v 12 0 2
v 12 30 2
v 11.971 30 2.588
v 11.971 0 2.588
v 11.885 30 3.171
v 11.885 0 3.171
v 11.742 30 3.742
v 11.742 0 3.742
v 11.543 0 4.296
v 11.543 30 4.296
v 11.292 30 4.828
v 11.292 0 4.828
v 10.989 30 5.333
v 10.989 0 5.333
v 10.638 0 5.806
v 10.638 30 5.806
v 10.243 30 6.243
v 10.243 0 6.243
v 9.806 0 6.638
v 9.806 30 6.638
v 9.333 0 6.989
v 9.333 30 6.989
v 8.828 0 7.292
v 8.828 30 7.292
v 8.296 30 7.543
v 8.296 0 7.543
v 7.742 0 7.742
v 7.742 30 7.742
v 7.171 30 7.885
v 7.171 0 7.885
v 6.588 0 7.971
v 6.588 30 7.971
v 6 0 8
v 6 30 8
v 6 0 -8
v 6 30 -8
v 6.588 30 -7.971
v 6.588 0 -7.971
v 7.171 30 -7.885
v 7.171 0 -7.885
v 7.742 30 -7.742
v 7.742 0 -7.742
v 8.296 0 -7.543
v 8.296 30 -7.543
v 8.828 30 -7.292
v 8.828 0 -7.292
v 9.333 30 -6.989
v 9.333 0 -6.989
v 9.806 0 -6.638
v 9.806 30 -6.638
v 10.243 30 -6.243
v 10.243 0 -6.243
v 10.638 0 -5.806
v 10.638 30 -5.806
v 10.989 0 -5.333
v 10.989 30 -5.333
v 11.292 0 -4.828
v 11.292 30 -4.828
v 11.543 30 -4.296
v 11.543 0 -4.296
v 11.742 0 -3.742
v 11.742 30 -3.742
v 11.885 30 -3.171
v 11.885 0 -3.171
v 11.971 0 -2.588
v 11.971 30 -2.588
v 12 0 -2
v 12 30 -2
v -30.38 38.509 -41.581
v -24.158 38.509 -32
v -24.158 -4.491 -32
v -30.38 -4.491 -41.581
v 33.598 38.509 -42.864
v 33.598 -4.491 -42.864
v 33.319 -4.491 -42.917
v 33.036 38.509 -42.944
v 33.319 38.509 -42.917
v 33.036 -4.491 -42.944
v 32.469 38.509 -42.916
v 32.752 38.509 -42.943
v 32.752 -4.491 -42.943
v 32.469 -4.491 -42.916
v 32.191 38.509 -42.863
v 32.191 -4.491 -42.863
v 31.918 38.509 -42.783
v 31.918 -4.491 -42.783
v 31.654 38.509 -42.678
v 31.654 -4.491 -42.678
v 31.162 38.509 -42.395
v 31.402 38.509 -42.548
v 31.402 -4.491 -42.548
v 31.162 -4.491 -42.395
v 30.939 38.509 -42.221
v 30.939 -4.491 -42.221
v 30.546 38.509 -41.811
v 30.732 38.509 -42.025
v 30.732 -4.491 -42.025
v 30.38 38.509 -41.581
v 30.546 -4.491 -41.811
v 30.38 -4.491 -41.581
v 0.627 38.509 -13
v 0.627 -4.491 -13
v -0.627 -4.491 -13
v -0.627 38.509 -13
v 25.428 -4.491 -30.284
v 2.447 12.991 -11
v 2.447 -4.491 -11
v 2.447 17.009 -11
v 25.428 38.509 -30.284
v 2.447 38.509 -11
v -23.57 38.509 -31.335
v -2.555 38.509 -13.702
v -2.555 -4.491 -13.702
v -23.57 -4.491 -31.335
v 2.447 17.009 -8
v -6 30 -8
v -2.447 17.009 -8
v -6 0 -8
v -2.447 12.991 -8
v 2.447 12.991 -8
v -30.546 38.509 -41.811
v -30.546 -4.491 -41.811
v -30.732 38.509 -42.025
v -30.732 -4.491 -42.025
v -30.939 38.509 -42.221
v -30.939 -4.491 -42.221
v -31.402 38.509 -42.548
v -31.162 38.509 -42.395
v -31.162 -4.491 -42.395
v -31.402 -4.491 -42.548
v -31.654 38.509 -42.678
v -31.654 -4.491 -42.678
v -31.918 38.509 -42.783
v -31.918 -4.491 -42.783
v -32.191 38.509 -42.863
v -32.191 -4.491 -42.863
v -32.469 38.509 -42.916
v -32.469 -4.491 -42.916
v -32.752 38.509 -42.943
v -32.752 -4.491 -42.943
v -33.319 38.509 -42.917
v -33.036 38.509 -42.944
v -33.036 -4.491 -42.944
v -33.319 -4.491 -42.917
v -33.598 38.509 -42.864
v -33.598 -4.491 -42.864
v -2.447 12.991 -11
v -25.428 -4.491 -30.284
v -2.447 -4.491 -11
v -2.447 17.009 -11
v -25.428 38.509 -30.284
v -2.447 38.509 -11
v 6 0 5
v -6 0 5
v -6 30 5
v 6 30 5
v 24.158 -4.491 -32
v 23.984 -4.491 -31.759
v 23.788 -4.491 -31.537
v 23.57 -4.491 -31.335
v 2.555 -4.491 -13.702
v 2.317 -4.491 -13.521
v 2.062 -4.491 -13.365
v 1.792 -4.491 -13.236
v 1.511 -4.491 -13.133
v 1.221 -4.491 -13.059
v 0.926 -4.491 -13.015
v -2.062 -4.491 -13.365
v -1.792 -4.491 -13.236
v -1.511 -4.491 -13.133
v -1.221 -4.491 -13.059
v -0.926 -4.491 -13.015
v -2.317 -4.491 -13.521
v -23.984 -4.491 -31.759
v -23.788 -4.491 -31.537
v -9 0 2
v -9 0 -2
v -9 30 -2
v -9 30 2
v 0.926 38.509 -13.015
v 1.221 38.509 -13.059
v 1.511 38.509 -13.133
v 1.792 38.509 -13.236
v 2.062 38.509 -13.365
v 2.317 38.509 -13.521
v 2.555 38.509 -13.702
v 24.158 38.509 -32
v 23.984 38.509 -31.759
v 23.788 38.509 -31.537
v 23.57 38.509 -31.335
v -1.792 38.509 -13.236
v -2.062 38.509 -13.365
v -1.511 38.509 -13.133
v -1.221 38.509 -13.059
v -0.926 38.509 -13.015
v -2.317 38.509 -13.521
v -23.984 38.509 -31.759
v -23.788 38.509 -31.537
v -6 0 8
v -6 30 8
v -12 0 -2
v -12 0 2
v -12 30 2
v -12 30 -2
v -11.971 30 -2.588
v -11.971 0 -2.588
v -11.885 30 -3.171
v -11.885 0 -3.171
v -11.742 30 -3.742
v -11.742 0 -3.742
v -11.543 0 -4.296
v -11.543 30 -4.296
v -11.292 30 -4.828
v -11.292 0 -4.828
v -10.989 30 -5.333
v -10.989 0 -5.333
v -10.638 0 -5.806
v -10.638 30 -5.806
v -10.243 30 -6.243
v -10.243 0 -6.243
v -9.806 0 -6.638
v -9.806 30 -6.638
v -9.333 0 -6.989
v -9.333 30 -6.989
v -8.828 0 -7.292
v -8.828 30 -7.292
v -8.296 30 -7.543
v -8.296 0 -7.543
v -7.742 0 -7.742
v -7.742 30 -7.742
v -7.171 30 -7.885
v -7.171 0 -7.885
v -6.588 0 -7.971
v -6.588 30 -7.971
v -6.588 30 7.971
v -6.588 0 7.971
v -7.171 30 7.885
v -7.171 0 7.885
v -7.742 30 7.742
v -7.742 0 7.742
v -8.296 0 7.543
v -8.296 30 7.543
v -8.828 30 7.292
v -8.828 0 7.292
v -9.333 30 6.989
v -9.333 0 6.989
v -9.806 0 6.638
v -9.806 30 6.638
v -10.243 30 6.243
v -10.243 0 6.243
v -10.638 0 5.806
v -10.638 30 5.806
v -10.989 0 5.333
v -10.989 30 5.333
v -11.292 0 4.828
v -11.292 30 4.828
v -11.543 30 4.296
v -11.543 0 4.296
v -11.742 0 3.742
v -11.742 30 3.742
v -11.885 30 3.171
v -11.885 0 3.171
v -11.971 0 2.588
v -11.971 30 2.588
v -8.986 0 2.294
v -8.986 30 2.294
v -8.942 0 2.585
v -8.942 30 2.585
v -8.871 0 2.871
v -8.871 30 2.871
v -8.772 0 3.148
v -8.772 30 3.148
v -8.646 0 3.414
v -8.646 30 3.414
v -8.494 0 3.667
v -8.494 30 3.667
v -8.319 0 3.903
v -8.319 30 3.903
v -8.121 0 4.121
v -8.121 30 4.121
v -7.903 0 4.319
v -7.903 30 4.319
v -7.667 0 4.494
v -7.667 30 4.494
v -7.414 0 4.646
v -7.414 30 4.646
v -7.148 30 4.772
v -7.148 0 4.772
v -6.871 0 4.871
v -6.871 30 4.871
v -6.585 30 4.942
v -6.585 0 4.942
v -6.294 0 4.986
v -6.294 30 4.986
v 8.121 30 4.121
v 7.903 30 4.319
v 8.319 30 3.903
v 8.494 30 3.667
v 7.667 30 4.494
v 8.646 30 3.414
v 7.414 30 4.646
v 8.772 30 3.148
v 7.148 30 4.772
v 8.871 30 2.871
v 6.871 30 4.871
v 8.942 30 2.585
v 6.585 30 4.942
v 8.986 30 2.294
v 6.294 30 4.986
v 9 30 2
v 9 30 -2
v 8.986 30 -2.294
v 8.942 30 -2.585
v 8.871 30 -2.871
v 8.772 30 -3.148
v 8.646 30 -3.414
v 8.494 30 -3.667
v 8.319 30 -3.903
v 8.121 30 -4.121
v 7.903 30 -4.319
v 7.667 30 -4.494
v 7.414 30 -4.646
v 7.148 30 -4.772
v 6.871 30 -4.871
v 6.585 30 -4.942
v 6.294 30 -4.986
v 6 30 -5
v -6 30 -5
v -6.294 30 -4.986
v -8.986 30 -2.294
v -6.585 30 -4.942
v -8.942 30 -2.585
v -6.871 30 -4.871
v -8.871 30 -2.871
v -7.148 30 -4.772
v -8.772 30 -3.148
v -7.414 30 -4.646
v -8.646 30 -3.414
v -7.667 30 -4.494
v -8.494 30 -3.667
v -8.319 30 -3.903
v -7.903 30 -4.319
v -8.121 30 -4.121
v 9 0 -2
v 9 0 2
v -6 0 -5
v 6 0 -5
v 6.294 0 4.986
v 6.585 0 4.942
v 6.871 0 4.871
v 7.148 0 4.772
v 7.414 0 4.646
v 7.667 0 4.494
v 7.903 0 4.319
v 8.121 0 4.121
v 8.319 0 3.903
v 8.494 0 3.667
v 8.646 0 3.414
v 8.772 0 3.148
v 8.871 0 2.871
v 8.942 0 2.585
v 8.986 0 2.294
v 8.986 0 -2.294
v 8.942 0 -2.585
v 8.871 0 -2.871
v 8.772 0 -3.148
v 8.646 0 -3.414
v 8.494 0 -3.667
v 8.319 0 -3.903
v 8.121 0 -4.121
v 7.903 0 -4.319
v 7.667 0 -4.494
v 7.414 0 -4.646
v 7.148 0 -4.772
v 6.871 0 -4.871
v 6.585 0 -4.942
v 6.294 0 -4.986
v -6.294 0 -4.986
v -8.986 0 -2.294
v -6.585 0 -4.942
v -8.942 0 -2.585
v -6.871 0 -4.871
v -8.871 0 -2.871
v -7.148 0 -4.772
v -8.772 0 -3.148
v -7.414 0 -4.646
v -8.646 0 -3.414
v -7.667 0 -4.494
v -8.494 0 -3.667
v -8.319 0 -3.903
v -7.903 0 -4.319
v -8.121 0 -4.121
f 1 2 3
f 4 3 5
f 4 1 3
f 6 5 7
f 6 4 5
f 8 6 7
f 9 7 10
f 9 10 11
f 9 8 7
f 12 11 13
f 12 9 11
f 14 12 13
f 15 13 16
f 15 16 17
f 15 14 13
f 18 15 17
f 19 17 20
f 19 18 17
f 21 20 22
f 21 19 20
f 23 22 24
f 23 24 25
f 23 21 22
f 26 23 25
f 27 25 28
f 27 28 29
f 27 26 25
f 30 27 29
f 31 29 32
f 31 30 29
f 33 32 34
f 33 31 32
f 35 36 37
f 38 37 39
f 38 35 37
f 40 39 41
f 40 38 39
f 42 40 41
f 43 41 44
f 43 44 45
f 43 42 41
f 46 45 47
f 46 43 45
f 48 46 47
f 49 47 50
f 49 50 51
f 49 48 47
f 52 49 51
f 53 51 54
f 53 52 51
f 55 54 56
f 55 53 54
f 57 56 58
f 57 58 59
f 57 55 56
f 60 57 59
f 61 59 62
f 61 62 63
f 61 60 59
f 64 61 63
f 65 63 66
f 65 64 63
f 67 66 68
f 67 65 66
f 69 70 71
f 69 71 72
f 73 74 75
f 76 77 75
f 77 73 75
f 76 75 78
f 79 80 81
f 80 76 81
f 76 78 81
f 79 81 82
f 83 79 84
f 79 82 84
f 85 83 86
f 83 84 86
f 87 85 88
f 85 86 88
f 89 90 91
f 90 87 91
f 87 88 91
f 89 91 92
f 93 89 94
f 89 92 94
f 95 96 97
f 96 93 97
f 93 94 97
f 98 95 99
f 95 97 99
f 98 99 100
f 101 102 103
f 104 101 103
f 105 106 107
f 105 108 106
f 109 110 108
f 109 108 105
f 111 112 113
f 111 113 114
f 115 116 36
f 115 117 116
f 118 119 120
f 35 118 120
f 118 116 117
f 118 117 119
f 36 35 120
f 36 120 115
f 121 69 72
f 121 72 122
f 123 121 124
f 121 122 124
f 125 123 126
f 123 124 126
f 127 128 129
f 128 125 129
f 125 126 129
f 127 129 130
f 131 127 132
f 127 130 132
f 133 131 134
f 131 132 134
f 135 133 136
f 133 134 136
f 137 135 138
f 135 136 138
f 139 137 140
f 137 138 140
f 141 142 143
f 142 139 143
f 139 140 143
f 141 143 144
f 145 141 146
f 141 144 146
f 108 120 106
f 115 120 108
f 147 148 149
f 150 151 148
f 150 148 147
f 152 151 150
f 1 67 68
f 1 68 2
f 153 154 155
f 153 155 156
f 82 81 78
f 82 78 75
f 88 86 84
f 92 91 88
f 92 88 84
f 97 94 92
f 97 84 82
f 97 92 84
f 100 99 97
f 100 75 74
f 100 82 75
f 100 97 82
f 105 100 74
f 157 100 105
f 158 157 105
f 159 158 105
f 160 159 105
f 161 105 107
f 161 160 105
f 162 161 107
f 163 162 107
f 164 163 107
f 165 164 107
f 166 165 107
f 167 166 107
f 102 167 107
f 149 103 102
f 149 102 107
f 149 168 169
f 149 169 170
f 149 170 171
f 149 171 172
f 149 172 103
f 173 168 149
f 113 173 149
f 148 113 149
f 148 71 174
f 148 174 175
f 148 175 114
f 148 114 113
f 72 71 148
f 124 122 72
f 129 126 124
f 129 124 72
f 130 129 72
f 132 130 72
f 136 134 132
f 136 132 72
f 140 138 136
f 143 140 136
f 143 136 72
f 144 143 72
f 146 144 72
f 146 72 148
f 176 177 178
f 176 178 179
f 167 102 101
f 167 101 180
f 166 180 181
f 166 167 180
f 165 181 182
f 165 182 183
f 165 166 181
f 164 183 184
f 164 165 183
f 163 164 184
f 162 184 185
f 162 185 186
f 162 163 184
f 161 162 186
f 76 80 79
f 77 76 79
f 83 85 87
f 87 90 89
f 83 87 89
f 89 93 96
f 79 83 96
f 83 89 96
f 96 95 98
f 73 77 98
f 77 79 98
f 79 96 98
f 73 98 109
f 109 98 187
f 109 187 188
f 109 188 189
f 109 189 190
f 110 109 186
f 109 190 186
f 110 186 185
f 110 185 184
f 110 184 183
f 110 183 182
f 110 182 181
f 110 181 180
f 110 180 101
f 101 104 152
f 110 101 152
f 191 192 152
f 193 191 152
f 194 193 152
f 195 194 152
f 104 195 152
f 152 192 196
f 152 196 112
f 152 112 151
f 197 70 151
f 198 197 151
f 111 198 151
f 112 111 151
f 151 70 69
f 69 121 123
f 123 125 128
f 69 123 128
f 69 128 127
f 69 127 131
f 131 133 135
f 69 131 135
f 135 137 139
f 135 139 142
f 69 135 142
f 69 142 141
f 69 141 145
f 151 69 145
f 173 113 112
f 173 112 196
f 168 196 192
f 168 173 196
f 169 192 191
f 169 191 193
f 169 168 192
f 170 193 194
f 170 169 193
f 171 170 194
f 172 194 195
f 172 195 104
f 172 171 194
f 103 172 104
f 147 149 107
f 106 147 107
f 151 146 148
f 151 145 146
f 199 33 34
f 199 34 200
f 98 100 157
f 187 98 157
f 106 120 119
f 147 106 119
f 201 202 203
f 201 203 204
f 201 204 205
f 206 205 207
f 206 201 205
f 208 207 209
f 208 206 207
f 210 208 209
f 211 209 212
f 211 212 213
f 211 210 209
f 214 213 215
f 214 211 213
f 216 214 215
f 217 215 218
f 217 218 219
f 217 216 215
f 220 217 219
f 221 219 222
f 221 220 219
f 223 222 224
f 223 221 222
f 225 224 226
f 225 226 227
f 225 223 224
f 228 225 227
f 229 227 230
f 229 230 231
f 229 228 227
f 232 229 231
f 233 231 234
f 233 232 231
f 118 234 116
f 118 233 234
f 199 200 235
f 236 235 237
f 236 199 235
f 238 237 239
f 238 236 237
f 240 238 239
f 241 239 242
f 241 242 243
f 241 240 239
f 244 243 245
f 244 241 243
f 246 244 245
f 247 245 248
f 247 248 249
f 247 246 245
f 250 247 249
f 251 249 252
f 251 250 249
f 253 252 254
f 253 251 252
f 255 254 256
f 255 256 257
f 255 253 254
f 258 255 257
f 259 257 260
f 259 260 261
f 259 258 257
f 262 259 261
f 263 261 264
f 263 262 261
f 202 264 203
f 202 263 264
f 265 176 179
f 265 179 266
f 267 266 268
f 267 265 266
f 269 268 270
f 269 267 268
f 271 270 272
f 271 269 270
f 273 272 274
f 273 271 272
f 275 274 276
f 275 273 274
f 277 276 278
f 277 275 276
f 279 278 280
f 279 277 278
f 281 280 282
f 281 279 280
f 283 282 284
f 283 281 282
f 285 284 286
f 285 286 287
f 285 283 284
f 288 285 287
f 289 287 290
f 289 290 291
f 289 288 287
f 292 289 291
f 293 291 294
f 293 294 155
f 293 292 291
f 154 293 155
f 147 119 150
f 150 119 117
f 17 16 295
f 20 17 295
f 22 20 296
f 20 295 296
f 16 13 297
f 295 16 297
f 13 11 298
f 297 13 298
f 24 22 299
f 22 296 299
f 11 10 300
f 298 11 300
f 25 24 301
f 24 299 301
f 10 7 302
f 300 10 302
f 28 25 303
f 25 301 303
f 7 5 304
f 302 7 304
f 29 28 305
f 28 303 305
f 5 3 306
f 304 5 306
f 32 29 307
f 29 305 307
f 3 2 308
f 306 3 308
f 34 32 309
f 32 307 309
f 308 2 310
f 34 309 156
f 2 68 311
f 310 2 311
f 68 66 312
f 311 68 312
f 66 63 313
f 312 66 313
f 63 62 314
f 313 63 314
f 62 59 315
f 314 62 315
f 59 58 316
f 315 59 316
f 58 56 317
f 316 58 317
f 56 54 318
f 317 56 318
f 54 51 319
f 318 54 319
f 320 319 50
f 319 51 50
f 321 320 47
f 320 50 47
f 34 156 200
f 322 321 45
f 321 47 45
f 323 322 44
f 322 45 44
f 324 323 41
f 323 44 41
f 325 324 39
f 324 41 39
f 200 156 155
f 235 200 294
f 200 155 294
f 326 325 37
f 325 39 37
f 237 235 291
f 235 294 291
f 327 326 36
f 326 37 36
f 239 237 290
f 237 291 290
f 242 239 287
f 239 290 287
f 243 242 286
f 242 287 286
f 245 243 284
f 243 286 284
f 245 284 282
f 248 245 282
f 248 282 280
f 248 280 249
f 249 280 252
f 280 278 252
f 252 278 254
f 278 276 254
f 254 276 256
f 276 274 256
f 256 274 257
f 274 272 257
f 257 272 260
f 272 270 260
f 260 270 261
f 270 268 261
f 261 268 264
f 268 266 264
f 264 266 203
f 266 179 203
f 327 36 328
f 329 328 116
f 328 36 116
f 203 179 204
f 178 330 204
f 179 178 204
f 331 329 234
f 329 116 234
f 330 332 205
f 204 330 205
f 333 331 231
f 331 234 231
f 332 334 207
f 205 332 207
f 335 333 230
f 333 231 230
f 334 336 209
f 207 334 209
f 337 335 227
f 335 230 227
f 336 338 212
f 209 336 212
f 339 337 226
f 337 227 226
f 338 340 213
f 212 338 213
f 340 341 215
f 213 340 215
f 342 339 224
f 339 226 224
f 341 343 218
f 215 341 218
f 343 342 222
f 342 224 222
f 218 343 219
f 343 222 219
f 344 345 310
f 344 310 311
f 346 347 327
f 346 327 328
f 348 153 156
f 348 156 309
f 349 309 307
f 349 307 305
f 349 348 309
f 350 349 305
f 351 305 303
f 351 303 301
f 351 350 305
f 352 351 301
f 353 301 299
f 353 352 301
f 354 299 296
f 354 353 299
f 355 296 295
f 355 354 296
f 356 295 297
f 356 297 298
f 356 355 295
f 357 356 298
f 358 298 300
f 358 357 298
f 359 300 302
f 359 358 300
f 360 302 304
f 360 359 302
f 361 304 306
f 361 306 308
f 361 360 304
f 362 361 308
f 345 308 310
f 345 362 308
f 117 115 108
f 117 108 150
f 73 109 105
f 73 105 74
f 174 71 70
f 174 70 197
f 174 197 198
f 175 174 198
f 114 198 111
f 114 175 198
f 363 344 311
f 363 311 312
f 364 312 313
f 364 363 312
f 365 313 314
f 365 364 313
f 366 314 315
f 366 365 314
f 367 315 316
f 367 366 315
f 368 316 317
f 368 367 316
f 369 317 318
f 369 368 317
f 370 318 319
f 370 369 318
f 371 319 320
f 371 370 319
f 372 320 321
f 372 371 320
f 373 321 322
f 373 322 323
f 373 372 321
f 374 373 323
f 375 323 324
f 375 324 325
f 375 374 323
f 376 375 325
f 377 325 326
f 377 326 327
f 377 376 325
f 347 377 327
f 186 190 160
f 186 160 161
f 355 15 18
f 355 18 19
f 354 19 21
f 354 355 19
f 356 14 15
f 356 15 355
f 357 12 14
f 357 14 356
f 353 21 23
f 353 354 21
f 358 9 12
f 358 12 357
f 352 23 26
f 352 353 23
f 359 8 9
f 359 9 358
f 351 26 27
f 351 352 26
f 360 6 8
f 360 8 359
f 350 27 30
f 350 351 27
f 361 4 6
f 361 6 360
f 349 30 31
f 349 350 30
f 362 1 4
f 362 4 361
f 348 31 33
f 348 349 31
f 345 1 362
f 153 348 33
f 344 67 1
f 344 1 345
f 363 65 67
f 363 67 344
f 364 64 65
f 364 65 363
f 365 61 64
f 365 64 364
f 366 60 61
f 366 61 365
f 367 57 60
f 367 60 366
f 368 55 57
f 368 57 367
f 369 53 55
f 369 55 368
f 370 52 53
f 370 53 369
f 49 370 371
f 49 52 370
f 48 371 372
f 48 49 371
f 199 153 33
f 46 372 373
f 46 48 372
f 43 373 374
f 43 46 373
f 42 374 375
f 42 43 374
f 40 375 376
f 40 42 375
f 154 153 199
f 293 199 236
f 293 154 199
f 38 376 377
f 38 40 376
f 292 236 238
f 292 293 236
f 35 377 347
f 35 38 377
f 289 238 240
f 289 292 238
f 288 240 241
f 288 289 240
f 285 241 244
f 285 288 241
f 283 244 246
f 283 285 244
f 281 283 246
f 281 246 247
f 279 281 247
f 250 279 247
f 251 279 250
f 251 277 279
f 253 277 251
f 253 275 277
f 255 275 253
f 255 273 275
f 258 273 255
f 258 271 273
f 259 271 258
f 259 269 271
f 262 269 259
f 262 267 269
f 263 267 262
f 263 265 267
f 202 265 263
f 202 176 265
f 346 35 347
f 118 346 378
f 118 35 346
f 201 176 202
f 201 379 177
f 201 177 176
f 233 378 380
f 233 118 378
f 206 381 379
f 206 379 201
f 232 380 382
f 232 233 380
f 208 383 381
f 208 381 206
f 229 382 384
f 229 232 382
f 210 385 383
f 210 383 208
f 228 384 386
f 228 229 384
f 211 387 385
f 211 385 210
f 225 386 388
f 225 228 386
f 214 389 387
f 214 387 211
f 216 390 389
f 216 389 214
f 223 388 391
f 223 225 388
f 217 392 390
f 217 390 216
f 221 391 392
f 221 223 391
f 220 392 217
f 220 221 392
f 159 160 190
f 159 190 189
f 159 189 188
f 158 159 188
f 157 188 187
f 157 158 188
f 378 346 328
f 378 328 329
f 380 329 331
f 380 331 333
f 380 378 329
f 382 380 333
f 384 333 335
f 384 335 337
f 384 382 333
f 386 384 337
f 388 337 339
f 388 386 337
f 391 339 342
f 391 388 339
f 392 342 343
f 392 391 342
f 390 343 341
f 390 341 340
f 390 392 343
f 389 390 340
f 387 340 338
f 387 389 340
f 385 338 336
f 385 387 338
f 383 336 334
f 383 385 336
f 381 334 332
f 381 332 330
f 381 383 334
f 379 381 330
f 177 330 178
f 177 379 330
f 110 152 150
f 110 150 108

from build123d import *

# Parameters (mm, degrees)
SALIENTE_EXTRUIR1_DEPTH = 30
CROQUIS3_W              = 4.89350096
CROQUIS3_H              = 4.01782184
SALIENTE_EXTRUIR2_DEPTH = 3
SALIENTE_EXTRUIR3_DEPTH = 21.5
REDONDEO2_R             = 3


with BuildPart() as part:
    # Croquis1 → Saliente-Extruir1 (new body)
    with BuildSketch(Plane(origin=(0, 0, 0), x_dir=(1, 0, 0), z_dir=(0, 1, 0))):
        with BuildLine():
            Line((-6, 8), (6, 8))
            ThreePointArc((6, 8), (10.242640687, 6.242640687), (12, 2))
            Line((12, 2), (12, -2))
            ThreePointArc((12, -2), (10.242640687, -6.242640687), (6, -8))
            Line((6, -8), (-6, -8))
            ThreePointArc((-6, -8), (-10.242640687, -6.242640687), (-12, -2))
            Line((-12, -2), (-12, 2))
            ThreePointArc((-12, 2), (-10.242640687, 6.242640687), (-6, 8))
        make_face()
        with BuildLine():
            Line((-6, -5), (6, -5))
            ThreePointArc((6, -5), (8.121320344, -4.121320344), (9, -2))
            Line((9, -2), (9, 2))
            ThreePointArc((9, 2), (8.121320344, 4.121320344), (6, 5))
            Line((6, 5), (-6, 5))
            ThreePointArc((-6, 5), (-8.121320344, 4.121320344), (-9, 2))
            Line((-9, 2), (-9, -2))
            ThreePointArc((-9, -2), (-8.121320344, -4.121320344), (-6, -5))
        make_face(mode=Mode.SUBTRACT)
    extrude(amount=SALIENTE_EXTRUIR1_DEPTH)

    # Croquis3 → Saliente-Extruir2 (add)
    with BuildSketch(Plane(origin=(0, 0, -8), x_dir=(-1, 0, 0), z_dir=(0, 0, -1))):
        with Locations((0, 15)):
            Rectangle(CROQUIS3_W, CROQUIS3_H)
    extrude(amount=SALIENTE_EXTRUIR2_DEPTH)

    # Croquis7 → Saliente-Extruir3 (add, symmetric)
    with BuildSketch(Plane(origin=(0, 17.00891092, 0), x_dir=(1, 0, 0), z_dir=(0, 1, 0))):
        Polygon((-2.44675048, 11), (2.44675048, 11), (25.428083774, 30.283628291), (33.597669299, 42.86368681), (31.920328163, 43.95296488), (23.913536336, 31.623586673), (1.718810011, 13), (-1.718810011, 13), (-23.913536336, 31.623586673), (-31.920328163, 43.95296488), (-33.597669299, 42.86368681), (-25.428083774, 30.283628291), align=None)
    extrude(amount=SALIENTE_EXTRUIR3_DEPTH, both=True)

    # Redondeo2
    # the kernel refuses this fillet: 3 mm, written as the material it adds along each edge
    with BuildSketch(Plane(origin=(-23.913536336, -4.49108908, -31.623586673), x_dir=(0.7660444431189832, 0, 0.6427876096865331), z_dir=(0, 1, 0)), Plane(origin=(23.913536336, -4.49108908, -31.623586673), x_dir=(0.5446390350150309, 0, -0.8386705679454215), z_dir=(0, 1, 0))) as redondeo2_piece_1:
        with BuildLine():
            CenterArc((REDONDEO2_R * 0.149451001349, REDONDEO2_R), REDONDEO2_R, 253, 17)
            Line((-REDONDEO2_R * 0.142920703374, REDONDEO2_R * 0.043695244037), (0, 0))
            Line((0, 0), (REDONDEO2_R * 0.149451001349, 0))
        make_face()
    extrude(amount=43)
    with BuildSketch(Plane(origin=(1.718810011, -4.49108908, -13), x_dir=(0.7660444431189833, 0, -0.6427876096865328), z_dir=(0, 1, 0)), Plane(origin=(-1.718810011, -4.49108908, -13), x_dir=(1, 0, 0), z_dir=(0, 1, 0))) as redondeo2_piece_2:
        with BuildLine():
            CenterArc((REDONDEO2_R * 0.363970234266, REDONDEO2_R), REDONDEO2_R, 230, 40)
            Line((-REDONDEO2_R * 0.27881737542, REDONDEO2_R * 0.233955556881), (0, 0))
            Line((0, 0), (REDONDEO2_R * 0.363970234266, 0))
        make_face()
    extrude(amount=43)
    # the kernel refuses this fillet: 3 mm, written as the material it takes off along each edge
    with BuildSketch(Plane(origin=(31.920328163, -11.562156891, -43.95296488), x_dir=(0.8386705679454225, 0, 0.5446390350150296), z_dir=(0, 1, 0))) as redondeo2_2_piece_1:
        with BuildLine():
            CenterArc((3, -2.828427125), REDONDEO2_R, 109.471220634, 70.528779366)
            Line((0, -2.828427125), (0, 0))
            Line((0, 0), (2, 0))
        make_face()
    extrude(amount=57.142135624, mode=Mode.SUBTRACT)
    with BuildSketch(Plane(origin=(-31.920328163, -11.562156891, -43.95296488), x_dir=(0.5446390350150306, 0, 0.8386705679454217), z_dir=(0, 1, 0))) as redondeo2_2_piece_2:
        with BuildLine():
            CenterArc((2.828427125, -3), REDONDEO2_R, 90, 70.528779366)
            Line((0, -2), (0, 0))
            Line((0, 0), (2.828427125, 0))
        make_face()
    extrude(amount=57.142135624, mode=Mode.SUBTRACT)


solid = part.part
